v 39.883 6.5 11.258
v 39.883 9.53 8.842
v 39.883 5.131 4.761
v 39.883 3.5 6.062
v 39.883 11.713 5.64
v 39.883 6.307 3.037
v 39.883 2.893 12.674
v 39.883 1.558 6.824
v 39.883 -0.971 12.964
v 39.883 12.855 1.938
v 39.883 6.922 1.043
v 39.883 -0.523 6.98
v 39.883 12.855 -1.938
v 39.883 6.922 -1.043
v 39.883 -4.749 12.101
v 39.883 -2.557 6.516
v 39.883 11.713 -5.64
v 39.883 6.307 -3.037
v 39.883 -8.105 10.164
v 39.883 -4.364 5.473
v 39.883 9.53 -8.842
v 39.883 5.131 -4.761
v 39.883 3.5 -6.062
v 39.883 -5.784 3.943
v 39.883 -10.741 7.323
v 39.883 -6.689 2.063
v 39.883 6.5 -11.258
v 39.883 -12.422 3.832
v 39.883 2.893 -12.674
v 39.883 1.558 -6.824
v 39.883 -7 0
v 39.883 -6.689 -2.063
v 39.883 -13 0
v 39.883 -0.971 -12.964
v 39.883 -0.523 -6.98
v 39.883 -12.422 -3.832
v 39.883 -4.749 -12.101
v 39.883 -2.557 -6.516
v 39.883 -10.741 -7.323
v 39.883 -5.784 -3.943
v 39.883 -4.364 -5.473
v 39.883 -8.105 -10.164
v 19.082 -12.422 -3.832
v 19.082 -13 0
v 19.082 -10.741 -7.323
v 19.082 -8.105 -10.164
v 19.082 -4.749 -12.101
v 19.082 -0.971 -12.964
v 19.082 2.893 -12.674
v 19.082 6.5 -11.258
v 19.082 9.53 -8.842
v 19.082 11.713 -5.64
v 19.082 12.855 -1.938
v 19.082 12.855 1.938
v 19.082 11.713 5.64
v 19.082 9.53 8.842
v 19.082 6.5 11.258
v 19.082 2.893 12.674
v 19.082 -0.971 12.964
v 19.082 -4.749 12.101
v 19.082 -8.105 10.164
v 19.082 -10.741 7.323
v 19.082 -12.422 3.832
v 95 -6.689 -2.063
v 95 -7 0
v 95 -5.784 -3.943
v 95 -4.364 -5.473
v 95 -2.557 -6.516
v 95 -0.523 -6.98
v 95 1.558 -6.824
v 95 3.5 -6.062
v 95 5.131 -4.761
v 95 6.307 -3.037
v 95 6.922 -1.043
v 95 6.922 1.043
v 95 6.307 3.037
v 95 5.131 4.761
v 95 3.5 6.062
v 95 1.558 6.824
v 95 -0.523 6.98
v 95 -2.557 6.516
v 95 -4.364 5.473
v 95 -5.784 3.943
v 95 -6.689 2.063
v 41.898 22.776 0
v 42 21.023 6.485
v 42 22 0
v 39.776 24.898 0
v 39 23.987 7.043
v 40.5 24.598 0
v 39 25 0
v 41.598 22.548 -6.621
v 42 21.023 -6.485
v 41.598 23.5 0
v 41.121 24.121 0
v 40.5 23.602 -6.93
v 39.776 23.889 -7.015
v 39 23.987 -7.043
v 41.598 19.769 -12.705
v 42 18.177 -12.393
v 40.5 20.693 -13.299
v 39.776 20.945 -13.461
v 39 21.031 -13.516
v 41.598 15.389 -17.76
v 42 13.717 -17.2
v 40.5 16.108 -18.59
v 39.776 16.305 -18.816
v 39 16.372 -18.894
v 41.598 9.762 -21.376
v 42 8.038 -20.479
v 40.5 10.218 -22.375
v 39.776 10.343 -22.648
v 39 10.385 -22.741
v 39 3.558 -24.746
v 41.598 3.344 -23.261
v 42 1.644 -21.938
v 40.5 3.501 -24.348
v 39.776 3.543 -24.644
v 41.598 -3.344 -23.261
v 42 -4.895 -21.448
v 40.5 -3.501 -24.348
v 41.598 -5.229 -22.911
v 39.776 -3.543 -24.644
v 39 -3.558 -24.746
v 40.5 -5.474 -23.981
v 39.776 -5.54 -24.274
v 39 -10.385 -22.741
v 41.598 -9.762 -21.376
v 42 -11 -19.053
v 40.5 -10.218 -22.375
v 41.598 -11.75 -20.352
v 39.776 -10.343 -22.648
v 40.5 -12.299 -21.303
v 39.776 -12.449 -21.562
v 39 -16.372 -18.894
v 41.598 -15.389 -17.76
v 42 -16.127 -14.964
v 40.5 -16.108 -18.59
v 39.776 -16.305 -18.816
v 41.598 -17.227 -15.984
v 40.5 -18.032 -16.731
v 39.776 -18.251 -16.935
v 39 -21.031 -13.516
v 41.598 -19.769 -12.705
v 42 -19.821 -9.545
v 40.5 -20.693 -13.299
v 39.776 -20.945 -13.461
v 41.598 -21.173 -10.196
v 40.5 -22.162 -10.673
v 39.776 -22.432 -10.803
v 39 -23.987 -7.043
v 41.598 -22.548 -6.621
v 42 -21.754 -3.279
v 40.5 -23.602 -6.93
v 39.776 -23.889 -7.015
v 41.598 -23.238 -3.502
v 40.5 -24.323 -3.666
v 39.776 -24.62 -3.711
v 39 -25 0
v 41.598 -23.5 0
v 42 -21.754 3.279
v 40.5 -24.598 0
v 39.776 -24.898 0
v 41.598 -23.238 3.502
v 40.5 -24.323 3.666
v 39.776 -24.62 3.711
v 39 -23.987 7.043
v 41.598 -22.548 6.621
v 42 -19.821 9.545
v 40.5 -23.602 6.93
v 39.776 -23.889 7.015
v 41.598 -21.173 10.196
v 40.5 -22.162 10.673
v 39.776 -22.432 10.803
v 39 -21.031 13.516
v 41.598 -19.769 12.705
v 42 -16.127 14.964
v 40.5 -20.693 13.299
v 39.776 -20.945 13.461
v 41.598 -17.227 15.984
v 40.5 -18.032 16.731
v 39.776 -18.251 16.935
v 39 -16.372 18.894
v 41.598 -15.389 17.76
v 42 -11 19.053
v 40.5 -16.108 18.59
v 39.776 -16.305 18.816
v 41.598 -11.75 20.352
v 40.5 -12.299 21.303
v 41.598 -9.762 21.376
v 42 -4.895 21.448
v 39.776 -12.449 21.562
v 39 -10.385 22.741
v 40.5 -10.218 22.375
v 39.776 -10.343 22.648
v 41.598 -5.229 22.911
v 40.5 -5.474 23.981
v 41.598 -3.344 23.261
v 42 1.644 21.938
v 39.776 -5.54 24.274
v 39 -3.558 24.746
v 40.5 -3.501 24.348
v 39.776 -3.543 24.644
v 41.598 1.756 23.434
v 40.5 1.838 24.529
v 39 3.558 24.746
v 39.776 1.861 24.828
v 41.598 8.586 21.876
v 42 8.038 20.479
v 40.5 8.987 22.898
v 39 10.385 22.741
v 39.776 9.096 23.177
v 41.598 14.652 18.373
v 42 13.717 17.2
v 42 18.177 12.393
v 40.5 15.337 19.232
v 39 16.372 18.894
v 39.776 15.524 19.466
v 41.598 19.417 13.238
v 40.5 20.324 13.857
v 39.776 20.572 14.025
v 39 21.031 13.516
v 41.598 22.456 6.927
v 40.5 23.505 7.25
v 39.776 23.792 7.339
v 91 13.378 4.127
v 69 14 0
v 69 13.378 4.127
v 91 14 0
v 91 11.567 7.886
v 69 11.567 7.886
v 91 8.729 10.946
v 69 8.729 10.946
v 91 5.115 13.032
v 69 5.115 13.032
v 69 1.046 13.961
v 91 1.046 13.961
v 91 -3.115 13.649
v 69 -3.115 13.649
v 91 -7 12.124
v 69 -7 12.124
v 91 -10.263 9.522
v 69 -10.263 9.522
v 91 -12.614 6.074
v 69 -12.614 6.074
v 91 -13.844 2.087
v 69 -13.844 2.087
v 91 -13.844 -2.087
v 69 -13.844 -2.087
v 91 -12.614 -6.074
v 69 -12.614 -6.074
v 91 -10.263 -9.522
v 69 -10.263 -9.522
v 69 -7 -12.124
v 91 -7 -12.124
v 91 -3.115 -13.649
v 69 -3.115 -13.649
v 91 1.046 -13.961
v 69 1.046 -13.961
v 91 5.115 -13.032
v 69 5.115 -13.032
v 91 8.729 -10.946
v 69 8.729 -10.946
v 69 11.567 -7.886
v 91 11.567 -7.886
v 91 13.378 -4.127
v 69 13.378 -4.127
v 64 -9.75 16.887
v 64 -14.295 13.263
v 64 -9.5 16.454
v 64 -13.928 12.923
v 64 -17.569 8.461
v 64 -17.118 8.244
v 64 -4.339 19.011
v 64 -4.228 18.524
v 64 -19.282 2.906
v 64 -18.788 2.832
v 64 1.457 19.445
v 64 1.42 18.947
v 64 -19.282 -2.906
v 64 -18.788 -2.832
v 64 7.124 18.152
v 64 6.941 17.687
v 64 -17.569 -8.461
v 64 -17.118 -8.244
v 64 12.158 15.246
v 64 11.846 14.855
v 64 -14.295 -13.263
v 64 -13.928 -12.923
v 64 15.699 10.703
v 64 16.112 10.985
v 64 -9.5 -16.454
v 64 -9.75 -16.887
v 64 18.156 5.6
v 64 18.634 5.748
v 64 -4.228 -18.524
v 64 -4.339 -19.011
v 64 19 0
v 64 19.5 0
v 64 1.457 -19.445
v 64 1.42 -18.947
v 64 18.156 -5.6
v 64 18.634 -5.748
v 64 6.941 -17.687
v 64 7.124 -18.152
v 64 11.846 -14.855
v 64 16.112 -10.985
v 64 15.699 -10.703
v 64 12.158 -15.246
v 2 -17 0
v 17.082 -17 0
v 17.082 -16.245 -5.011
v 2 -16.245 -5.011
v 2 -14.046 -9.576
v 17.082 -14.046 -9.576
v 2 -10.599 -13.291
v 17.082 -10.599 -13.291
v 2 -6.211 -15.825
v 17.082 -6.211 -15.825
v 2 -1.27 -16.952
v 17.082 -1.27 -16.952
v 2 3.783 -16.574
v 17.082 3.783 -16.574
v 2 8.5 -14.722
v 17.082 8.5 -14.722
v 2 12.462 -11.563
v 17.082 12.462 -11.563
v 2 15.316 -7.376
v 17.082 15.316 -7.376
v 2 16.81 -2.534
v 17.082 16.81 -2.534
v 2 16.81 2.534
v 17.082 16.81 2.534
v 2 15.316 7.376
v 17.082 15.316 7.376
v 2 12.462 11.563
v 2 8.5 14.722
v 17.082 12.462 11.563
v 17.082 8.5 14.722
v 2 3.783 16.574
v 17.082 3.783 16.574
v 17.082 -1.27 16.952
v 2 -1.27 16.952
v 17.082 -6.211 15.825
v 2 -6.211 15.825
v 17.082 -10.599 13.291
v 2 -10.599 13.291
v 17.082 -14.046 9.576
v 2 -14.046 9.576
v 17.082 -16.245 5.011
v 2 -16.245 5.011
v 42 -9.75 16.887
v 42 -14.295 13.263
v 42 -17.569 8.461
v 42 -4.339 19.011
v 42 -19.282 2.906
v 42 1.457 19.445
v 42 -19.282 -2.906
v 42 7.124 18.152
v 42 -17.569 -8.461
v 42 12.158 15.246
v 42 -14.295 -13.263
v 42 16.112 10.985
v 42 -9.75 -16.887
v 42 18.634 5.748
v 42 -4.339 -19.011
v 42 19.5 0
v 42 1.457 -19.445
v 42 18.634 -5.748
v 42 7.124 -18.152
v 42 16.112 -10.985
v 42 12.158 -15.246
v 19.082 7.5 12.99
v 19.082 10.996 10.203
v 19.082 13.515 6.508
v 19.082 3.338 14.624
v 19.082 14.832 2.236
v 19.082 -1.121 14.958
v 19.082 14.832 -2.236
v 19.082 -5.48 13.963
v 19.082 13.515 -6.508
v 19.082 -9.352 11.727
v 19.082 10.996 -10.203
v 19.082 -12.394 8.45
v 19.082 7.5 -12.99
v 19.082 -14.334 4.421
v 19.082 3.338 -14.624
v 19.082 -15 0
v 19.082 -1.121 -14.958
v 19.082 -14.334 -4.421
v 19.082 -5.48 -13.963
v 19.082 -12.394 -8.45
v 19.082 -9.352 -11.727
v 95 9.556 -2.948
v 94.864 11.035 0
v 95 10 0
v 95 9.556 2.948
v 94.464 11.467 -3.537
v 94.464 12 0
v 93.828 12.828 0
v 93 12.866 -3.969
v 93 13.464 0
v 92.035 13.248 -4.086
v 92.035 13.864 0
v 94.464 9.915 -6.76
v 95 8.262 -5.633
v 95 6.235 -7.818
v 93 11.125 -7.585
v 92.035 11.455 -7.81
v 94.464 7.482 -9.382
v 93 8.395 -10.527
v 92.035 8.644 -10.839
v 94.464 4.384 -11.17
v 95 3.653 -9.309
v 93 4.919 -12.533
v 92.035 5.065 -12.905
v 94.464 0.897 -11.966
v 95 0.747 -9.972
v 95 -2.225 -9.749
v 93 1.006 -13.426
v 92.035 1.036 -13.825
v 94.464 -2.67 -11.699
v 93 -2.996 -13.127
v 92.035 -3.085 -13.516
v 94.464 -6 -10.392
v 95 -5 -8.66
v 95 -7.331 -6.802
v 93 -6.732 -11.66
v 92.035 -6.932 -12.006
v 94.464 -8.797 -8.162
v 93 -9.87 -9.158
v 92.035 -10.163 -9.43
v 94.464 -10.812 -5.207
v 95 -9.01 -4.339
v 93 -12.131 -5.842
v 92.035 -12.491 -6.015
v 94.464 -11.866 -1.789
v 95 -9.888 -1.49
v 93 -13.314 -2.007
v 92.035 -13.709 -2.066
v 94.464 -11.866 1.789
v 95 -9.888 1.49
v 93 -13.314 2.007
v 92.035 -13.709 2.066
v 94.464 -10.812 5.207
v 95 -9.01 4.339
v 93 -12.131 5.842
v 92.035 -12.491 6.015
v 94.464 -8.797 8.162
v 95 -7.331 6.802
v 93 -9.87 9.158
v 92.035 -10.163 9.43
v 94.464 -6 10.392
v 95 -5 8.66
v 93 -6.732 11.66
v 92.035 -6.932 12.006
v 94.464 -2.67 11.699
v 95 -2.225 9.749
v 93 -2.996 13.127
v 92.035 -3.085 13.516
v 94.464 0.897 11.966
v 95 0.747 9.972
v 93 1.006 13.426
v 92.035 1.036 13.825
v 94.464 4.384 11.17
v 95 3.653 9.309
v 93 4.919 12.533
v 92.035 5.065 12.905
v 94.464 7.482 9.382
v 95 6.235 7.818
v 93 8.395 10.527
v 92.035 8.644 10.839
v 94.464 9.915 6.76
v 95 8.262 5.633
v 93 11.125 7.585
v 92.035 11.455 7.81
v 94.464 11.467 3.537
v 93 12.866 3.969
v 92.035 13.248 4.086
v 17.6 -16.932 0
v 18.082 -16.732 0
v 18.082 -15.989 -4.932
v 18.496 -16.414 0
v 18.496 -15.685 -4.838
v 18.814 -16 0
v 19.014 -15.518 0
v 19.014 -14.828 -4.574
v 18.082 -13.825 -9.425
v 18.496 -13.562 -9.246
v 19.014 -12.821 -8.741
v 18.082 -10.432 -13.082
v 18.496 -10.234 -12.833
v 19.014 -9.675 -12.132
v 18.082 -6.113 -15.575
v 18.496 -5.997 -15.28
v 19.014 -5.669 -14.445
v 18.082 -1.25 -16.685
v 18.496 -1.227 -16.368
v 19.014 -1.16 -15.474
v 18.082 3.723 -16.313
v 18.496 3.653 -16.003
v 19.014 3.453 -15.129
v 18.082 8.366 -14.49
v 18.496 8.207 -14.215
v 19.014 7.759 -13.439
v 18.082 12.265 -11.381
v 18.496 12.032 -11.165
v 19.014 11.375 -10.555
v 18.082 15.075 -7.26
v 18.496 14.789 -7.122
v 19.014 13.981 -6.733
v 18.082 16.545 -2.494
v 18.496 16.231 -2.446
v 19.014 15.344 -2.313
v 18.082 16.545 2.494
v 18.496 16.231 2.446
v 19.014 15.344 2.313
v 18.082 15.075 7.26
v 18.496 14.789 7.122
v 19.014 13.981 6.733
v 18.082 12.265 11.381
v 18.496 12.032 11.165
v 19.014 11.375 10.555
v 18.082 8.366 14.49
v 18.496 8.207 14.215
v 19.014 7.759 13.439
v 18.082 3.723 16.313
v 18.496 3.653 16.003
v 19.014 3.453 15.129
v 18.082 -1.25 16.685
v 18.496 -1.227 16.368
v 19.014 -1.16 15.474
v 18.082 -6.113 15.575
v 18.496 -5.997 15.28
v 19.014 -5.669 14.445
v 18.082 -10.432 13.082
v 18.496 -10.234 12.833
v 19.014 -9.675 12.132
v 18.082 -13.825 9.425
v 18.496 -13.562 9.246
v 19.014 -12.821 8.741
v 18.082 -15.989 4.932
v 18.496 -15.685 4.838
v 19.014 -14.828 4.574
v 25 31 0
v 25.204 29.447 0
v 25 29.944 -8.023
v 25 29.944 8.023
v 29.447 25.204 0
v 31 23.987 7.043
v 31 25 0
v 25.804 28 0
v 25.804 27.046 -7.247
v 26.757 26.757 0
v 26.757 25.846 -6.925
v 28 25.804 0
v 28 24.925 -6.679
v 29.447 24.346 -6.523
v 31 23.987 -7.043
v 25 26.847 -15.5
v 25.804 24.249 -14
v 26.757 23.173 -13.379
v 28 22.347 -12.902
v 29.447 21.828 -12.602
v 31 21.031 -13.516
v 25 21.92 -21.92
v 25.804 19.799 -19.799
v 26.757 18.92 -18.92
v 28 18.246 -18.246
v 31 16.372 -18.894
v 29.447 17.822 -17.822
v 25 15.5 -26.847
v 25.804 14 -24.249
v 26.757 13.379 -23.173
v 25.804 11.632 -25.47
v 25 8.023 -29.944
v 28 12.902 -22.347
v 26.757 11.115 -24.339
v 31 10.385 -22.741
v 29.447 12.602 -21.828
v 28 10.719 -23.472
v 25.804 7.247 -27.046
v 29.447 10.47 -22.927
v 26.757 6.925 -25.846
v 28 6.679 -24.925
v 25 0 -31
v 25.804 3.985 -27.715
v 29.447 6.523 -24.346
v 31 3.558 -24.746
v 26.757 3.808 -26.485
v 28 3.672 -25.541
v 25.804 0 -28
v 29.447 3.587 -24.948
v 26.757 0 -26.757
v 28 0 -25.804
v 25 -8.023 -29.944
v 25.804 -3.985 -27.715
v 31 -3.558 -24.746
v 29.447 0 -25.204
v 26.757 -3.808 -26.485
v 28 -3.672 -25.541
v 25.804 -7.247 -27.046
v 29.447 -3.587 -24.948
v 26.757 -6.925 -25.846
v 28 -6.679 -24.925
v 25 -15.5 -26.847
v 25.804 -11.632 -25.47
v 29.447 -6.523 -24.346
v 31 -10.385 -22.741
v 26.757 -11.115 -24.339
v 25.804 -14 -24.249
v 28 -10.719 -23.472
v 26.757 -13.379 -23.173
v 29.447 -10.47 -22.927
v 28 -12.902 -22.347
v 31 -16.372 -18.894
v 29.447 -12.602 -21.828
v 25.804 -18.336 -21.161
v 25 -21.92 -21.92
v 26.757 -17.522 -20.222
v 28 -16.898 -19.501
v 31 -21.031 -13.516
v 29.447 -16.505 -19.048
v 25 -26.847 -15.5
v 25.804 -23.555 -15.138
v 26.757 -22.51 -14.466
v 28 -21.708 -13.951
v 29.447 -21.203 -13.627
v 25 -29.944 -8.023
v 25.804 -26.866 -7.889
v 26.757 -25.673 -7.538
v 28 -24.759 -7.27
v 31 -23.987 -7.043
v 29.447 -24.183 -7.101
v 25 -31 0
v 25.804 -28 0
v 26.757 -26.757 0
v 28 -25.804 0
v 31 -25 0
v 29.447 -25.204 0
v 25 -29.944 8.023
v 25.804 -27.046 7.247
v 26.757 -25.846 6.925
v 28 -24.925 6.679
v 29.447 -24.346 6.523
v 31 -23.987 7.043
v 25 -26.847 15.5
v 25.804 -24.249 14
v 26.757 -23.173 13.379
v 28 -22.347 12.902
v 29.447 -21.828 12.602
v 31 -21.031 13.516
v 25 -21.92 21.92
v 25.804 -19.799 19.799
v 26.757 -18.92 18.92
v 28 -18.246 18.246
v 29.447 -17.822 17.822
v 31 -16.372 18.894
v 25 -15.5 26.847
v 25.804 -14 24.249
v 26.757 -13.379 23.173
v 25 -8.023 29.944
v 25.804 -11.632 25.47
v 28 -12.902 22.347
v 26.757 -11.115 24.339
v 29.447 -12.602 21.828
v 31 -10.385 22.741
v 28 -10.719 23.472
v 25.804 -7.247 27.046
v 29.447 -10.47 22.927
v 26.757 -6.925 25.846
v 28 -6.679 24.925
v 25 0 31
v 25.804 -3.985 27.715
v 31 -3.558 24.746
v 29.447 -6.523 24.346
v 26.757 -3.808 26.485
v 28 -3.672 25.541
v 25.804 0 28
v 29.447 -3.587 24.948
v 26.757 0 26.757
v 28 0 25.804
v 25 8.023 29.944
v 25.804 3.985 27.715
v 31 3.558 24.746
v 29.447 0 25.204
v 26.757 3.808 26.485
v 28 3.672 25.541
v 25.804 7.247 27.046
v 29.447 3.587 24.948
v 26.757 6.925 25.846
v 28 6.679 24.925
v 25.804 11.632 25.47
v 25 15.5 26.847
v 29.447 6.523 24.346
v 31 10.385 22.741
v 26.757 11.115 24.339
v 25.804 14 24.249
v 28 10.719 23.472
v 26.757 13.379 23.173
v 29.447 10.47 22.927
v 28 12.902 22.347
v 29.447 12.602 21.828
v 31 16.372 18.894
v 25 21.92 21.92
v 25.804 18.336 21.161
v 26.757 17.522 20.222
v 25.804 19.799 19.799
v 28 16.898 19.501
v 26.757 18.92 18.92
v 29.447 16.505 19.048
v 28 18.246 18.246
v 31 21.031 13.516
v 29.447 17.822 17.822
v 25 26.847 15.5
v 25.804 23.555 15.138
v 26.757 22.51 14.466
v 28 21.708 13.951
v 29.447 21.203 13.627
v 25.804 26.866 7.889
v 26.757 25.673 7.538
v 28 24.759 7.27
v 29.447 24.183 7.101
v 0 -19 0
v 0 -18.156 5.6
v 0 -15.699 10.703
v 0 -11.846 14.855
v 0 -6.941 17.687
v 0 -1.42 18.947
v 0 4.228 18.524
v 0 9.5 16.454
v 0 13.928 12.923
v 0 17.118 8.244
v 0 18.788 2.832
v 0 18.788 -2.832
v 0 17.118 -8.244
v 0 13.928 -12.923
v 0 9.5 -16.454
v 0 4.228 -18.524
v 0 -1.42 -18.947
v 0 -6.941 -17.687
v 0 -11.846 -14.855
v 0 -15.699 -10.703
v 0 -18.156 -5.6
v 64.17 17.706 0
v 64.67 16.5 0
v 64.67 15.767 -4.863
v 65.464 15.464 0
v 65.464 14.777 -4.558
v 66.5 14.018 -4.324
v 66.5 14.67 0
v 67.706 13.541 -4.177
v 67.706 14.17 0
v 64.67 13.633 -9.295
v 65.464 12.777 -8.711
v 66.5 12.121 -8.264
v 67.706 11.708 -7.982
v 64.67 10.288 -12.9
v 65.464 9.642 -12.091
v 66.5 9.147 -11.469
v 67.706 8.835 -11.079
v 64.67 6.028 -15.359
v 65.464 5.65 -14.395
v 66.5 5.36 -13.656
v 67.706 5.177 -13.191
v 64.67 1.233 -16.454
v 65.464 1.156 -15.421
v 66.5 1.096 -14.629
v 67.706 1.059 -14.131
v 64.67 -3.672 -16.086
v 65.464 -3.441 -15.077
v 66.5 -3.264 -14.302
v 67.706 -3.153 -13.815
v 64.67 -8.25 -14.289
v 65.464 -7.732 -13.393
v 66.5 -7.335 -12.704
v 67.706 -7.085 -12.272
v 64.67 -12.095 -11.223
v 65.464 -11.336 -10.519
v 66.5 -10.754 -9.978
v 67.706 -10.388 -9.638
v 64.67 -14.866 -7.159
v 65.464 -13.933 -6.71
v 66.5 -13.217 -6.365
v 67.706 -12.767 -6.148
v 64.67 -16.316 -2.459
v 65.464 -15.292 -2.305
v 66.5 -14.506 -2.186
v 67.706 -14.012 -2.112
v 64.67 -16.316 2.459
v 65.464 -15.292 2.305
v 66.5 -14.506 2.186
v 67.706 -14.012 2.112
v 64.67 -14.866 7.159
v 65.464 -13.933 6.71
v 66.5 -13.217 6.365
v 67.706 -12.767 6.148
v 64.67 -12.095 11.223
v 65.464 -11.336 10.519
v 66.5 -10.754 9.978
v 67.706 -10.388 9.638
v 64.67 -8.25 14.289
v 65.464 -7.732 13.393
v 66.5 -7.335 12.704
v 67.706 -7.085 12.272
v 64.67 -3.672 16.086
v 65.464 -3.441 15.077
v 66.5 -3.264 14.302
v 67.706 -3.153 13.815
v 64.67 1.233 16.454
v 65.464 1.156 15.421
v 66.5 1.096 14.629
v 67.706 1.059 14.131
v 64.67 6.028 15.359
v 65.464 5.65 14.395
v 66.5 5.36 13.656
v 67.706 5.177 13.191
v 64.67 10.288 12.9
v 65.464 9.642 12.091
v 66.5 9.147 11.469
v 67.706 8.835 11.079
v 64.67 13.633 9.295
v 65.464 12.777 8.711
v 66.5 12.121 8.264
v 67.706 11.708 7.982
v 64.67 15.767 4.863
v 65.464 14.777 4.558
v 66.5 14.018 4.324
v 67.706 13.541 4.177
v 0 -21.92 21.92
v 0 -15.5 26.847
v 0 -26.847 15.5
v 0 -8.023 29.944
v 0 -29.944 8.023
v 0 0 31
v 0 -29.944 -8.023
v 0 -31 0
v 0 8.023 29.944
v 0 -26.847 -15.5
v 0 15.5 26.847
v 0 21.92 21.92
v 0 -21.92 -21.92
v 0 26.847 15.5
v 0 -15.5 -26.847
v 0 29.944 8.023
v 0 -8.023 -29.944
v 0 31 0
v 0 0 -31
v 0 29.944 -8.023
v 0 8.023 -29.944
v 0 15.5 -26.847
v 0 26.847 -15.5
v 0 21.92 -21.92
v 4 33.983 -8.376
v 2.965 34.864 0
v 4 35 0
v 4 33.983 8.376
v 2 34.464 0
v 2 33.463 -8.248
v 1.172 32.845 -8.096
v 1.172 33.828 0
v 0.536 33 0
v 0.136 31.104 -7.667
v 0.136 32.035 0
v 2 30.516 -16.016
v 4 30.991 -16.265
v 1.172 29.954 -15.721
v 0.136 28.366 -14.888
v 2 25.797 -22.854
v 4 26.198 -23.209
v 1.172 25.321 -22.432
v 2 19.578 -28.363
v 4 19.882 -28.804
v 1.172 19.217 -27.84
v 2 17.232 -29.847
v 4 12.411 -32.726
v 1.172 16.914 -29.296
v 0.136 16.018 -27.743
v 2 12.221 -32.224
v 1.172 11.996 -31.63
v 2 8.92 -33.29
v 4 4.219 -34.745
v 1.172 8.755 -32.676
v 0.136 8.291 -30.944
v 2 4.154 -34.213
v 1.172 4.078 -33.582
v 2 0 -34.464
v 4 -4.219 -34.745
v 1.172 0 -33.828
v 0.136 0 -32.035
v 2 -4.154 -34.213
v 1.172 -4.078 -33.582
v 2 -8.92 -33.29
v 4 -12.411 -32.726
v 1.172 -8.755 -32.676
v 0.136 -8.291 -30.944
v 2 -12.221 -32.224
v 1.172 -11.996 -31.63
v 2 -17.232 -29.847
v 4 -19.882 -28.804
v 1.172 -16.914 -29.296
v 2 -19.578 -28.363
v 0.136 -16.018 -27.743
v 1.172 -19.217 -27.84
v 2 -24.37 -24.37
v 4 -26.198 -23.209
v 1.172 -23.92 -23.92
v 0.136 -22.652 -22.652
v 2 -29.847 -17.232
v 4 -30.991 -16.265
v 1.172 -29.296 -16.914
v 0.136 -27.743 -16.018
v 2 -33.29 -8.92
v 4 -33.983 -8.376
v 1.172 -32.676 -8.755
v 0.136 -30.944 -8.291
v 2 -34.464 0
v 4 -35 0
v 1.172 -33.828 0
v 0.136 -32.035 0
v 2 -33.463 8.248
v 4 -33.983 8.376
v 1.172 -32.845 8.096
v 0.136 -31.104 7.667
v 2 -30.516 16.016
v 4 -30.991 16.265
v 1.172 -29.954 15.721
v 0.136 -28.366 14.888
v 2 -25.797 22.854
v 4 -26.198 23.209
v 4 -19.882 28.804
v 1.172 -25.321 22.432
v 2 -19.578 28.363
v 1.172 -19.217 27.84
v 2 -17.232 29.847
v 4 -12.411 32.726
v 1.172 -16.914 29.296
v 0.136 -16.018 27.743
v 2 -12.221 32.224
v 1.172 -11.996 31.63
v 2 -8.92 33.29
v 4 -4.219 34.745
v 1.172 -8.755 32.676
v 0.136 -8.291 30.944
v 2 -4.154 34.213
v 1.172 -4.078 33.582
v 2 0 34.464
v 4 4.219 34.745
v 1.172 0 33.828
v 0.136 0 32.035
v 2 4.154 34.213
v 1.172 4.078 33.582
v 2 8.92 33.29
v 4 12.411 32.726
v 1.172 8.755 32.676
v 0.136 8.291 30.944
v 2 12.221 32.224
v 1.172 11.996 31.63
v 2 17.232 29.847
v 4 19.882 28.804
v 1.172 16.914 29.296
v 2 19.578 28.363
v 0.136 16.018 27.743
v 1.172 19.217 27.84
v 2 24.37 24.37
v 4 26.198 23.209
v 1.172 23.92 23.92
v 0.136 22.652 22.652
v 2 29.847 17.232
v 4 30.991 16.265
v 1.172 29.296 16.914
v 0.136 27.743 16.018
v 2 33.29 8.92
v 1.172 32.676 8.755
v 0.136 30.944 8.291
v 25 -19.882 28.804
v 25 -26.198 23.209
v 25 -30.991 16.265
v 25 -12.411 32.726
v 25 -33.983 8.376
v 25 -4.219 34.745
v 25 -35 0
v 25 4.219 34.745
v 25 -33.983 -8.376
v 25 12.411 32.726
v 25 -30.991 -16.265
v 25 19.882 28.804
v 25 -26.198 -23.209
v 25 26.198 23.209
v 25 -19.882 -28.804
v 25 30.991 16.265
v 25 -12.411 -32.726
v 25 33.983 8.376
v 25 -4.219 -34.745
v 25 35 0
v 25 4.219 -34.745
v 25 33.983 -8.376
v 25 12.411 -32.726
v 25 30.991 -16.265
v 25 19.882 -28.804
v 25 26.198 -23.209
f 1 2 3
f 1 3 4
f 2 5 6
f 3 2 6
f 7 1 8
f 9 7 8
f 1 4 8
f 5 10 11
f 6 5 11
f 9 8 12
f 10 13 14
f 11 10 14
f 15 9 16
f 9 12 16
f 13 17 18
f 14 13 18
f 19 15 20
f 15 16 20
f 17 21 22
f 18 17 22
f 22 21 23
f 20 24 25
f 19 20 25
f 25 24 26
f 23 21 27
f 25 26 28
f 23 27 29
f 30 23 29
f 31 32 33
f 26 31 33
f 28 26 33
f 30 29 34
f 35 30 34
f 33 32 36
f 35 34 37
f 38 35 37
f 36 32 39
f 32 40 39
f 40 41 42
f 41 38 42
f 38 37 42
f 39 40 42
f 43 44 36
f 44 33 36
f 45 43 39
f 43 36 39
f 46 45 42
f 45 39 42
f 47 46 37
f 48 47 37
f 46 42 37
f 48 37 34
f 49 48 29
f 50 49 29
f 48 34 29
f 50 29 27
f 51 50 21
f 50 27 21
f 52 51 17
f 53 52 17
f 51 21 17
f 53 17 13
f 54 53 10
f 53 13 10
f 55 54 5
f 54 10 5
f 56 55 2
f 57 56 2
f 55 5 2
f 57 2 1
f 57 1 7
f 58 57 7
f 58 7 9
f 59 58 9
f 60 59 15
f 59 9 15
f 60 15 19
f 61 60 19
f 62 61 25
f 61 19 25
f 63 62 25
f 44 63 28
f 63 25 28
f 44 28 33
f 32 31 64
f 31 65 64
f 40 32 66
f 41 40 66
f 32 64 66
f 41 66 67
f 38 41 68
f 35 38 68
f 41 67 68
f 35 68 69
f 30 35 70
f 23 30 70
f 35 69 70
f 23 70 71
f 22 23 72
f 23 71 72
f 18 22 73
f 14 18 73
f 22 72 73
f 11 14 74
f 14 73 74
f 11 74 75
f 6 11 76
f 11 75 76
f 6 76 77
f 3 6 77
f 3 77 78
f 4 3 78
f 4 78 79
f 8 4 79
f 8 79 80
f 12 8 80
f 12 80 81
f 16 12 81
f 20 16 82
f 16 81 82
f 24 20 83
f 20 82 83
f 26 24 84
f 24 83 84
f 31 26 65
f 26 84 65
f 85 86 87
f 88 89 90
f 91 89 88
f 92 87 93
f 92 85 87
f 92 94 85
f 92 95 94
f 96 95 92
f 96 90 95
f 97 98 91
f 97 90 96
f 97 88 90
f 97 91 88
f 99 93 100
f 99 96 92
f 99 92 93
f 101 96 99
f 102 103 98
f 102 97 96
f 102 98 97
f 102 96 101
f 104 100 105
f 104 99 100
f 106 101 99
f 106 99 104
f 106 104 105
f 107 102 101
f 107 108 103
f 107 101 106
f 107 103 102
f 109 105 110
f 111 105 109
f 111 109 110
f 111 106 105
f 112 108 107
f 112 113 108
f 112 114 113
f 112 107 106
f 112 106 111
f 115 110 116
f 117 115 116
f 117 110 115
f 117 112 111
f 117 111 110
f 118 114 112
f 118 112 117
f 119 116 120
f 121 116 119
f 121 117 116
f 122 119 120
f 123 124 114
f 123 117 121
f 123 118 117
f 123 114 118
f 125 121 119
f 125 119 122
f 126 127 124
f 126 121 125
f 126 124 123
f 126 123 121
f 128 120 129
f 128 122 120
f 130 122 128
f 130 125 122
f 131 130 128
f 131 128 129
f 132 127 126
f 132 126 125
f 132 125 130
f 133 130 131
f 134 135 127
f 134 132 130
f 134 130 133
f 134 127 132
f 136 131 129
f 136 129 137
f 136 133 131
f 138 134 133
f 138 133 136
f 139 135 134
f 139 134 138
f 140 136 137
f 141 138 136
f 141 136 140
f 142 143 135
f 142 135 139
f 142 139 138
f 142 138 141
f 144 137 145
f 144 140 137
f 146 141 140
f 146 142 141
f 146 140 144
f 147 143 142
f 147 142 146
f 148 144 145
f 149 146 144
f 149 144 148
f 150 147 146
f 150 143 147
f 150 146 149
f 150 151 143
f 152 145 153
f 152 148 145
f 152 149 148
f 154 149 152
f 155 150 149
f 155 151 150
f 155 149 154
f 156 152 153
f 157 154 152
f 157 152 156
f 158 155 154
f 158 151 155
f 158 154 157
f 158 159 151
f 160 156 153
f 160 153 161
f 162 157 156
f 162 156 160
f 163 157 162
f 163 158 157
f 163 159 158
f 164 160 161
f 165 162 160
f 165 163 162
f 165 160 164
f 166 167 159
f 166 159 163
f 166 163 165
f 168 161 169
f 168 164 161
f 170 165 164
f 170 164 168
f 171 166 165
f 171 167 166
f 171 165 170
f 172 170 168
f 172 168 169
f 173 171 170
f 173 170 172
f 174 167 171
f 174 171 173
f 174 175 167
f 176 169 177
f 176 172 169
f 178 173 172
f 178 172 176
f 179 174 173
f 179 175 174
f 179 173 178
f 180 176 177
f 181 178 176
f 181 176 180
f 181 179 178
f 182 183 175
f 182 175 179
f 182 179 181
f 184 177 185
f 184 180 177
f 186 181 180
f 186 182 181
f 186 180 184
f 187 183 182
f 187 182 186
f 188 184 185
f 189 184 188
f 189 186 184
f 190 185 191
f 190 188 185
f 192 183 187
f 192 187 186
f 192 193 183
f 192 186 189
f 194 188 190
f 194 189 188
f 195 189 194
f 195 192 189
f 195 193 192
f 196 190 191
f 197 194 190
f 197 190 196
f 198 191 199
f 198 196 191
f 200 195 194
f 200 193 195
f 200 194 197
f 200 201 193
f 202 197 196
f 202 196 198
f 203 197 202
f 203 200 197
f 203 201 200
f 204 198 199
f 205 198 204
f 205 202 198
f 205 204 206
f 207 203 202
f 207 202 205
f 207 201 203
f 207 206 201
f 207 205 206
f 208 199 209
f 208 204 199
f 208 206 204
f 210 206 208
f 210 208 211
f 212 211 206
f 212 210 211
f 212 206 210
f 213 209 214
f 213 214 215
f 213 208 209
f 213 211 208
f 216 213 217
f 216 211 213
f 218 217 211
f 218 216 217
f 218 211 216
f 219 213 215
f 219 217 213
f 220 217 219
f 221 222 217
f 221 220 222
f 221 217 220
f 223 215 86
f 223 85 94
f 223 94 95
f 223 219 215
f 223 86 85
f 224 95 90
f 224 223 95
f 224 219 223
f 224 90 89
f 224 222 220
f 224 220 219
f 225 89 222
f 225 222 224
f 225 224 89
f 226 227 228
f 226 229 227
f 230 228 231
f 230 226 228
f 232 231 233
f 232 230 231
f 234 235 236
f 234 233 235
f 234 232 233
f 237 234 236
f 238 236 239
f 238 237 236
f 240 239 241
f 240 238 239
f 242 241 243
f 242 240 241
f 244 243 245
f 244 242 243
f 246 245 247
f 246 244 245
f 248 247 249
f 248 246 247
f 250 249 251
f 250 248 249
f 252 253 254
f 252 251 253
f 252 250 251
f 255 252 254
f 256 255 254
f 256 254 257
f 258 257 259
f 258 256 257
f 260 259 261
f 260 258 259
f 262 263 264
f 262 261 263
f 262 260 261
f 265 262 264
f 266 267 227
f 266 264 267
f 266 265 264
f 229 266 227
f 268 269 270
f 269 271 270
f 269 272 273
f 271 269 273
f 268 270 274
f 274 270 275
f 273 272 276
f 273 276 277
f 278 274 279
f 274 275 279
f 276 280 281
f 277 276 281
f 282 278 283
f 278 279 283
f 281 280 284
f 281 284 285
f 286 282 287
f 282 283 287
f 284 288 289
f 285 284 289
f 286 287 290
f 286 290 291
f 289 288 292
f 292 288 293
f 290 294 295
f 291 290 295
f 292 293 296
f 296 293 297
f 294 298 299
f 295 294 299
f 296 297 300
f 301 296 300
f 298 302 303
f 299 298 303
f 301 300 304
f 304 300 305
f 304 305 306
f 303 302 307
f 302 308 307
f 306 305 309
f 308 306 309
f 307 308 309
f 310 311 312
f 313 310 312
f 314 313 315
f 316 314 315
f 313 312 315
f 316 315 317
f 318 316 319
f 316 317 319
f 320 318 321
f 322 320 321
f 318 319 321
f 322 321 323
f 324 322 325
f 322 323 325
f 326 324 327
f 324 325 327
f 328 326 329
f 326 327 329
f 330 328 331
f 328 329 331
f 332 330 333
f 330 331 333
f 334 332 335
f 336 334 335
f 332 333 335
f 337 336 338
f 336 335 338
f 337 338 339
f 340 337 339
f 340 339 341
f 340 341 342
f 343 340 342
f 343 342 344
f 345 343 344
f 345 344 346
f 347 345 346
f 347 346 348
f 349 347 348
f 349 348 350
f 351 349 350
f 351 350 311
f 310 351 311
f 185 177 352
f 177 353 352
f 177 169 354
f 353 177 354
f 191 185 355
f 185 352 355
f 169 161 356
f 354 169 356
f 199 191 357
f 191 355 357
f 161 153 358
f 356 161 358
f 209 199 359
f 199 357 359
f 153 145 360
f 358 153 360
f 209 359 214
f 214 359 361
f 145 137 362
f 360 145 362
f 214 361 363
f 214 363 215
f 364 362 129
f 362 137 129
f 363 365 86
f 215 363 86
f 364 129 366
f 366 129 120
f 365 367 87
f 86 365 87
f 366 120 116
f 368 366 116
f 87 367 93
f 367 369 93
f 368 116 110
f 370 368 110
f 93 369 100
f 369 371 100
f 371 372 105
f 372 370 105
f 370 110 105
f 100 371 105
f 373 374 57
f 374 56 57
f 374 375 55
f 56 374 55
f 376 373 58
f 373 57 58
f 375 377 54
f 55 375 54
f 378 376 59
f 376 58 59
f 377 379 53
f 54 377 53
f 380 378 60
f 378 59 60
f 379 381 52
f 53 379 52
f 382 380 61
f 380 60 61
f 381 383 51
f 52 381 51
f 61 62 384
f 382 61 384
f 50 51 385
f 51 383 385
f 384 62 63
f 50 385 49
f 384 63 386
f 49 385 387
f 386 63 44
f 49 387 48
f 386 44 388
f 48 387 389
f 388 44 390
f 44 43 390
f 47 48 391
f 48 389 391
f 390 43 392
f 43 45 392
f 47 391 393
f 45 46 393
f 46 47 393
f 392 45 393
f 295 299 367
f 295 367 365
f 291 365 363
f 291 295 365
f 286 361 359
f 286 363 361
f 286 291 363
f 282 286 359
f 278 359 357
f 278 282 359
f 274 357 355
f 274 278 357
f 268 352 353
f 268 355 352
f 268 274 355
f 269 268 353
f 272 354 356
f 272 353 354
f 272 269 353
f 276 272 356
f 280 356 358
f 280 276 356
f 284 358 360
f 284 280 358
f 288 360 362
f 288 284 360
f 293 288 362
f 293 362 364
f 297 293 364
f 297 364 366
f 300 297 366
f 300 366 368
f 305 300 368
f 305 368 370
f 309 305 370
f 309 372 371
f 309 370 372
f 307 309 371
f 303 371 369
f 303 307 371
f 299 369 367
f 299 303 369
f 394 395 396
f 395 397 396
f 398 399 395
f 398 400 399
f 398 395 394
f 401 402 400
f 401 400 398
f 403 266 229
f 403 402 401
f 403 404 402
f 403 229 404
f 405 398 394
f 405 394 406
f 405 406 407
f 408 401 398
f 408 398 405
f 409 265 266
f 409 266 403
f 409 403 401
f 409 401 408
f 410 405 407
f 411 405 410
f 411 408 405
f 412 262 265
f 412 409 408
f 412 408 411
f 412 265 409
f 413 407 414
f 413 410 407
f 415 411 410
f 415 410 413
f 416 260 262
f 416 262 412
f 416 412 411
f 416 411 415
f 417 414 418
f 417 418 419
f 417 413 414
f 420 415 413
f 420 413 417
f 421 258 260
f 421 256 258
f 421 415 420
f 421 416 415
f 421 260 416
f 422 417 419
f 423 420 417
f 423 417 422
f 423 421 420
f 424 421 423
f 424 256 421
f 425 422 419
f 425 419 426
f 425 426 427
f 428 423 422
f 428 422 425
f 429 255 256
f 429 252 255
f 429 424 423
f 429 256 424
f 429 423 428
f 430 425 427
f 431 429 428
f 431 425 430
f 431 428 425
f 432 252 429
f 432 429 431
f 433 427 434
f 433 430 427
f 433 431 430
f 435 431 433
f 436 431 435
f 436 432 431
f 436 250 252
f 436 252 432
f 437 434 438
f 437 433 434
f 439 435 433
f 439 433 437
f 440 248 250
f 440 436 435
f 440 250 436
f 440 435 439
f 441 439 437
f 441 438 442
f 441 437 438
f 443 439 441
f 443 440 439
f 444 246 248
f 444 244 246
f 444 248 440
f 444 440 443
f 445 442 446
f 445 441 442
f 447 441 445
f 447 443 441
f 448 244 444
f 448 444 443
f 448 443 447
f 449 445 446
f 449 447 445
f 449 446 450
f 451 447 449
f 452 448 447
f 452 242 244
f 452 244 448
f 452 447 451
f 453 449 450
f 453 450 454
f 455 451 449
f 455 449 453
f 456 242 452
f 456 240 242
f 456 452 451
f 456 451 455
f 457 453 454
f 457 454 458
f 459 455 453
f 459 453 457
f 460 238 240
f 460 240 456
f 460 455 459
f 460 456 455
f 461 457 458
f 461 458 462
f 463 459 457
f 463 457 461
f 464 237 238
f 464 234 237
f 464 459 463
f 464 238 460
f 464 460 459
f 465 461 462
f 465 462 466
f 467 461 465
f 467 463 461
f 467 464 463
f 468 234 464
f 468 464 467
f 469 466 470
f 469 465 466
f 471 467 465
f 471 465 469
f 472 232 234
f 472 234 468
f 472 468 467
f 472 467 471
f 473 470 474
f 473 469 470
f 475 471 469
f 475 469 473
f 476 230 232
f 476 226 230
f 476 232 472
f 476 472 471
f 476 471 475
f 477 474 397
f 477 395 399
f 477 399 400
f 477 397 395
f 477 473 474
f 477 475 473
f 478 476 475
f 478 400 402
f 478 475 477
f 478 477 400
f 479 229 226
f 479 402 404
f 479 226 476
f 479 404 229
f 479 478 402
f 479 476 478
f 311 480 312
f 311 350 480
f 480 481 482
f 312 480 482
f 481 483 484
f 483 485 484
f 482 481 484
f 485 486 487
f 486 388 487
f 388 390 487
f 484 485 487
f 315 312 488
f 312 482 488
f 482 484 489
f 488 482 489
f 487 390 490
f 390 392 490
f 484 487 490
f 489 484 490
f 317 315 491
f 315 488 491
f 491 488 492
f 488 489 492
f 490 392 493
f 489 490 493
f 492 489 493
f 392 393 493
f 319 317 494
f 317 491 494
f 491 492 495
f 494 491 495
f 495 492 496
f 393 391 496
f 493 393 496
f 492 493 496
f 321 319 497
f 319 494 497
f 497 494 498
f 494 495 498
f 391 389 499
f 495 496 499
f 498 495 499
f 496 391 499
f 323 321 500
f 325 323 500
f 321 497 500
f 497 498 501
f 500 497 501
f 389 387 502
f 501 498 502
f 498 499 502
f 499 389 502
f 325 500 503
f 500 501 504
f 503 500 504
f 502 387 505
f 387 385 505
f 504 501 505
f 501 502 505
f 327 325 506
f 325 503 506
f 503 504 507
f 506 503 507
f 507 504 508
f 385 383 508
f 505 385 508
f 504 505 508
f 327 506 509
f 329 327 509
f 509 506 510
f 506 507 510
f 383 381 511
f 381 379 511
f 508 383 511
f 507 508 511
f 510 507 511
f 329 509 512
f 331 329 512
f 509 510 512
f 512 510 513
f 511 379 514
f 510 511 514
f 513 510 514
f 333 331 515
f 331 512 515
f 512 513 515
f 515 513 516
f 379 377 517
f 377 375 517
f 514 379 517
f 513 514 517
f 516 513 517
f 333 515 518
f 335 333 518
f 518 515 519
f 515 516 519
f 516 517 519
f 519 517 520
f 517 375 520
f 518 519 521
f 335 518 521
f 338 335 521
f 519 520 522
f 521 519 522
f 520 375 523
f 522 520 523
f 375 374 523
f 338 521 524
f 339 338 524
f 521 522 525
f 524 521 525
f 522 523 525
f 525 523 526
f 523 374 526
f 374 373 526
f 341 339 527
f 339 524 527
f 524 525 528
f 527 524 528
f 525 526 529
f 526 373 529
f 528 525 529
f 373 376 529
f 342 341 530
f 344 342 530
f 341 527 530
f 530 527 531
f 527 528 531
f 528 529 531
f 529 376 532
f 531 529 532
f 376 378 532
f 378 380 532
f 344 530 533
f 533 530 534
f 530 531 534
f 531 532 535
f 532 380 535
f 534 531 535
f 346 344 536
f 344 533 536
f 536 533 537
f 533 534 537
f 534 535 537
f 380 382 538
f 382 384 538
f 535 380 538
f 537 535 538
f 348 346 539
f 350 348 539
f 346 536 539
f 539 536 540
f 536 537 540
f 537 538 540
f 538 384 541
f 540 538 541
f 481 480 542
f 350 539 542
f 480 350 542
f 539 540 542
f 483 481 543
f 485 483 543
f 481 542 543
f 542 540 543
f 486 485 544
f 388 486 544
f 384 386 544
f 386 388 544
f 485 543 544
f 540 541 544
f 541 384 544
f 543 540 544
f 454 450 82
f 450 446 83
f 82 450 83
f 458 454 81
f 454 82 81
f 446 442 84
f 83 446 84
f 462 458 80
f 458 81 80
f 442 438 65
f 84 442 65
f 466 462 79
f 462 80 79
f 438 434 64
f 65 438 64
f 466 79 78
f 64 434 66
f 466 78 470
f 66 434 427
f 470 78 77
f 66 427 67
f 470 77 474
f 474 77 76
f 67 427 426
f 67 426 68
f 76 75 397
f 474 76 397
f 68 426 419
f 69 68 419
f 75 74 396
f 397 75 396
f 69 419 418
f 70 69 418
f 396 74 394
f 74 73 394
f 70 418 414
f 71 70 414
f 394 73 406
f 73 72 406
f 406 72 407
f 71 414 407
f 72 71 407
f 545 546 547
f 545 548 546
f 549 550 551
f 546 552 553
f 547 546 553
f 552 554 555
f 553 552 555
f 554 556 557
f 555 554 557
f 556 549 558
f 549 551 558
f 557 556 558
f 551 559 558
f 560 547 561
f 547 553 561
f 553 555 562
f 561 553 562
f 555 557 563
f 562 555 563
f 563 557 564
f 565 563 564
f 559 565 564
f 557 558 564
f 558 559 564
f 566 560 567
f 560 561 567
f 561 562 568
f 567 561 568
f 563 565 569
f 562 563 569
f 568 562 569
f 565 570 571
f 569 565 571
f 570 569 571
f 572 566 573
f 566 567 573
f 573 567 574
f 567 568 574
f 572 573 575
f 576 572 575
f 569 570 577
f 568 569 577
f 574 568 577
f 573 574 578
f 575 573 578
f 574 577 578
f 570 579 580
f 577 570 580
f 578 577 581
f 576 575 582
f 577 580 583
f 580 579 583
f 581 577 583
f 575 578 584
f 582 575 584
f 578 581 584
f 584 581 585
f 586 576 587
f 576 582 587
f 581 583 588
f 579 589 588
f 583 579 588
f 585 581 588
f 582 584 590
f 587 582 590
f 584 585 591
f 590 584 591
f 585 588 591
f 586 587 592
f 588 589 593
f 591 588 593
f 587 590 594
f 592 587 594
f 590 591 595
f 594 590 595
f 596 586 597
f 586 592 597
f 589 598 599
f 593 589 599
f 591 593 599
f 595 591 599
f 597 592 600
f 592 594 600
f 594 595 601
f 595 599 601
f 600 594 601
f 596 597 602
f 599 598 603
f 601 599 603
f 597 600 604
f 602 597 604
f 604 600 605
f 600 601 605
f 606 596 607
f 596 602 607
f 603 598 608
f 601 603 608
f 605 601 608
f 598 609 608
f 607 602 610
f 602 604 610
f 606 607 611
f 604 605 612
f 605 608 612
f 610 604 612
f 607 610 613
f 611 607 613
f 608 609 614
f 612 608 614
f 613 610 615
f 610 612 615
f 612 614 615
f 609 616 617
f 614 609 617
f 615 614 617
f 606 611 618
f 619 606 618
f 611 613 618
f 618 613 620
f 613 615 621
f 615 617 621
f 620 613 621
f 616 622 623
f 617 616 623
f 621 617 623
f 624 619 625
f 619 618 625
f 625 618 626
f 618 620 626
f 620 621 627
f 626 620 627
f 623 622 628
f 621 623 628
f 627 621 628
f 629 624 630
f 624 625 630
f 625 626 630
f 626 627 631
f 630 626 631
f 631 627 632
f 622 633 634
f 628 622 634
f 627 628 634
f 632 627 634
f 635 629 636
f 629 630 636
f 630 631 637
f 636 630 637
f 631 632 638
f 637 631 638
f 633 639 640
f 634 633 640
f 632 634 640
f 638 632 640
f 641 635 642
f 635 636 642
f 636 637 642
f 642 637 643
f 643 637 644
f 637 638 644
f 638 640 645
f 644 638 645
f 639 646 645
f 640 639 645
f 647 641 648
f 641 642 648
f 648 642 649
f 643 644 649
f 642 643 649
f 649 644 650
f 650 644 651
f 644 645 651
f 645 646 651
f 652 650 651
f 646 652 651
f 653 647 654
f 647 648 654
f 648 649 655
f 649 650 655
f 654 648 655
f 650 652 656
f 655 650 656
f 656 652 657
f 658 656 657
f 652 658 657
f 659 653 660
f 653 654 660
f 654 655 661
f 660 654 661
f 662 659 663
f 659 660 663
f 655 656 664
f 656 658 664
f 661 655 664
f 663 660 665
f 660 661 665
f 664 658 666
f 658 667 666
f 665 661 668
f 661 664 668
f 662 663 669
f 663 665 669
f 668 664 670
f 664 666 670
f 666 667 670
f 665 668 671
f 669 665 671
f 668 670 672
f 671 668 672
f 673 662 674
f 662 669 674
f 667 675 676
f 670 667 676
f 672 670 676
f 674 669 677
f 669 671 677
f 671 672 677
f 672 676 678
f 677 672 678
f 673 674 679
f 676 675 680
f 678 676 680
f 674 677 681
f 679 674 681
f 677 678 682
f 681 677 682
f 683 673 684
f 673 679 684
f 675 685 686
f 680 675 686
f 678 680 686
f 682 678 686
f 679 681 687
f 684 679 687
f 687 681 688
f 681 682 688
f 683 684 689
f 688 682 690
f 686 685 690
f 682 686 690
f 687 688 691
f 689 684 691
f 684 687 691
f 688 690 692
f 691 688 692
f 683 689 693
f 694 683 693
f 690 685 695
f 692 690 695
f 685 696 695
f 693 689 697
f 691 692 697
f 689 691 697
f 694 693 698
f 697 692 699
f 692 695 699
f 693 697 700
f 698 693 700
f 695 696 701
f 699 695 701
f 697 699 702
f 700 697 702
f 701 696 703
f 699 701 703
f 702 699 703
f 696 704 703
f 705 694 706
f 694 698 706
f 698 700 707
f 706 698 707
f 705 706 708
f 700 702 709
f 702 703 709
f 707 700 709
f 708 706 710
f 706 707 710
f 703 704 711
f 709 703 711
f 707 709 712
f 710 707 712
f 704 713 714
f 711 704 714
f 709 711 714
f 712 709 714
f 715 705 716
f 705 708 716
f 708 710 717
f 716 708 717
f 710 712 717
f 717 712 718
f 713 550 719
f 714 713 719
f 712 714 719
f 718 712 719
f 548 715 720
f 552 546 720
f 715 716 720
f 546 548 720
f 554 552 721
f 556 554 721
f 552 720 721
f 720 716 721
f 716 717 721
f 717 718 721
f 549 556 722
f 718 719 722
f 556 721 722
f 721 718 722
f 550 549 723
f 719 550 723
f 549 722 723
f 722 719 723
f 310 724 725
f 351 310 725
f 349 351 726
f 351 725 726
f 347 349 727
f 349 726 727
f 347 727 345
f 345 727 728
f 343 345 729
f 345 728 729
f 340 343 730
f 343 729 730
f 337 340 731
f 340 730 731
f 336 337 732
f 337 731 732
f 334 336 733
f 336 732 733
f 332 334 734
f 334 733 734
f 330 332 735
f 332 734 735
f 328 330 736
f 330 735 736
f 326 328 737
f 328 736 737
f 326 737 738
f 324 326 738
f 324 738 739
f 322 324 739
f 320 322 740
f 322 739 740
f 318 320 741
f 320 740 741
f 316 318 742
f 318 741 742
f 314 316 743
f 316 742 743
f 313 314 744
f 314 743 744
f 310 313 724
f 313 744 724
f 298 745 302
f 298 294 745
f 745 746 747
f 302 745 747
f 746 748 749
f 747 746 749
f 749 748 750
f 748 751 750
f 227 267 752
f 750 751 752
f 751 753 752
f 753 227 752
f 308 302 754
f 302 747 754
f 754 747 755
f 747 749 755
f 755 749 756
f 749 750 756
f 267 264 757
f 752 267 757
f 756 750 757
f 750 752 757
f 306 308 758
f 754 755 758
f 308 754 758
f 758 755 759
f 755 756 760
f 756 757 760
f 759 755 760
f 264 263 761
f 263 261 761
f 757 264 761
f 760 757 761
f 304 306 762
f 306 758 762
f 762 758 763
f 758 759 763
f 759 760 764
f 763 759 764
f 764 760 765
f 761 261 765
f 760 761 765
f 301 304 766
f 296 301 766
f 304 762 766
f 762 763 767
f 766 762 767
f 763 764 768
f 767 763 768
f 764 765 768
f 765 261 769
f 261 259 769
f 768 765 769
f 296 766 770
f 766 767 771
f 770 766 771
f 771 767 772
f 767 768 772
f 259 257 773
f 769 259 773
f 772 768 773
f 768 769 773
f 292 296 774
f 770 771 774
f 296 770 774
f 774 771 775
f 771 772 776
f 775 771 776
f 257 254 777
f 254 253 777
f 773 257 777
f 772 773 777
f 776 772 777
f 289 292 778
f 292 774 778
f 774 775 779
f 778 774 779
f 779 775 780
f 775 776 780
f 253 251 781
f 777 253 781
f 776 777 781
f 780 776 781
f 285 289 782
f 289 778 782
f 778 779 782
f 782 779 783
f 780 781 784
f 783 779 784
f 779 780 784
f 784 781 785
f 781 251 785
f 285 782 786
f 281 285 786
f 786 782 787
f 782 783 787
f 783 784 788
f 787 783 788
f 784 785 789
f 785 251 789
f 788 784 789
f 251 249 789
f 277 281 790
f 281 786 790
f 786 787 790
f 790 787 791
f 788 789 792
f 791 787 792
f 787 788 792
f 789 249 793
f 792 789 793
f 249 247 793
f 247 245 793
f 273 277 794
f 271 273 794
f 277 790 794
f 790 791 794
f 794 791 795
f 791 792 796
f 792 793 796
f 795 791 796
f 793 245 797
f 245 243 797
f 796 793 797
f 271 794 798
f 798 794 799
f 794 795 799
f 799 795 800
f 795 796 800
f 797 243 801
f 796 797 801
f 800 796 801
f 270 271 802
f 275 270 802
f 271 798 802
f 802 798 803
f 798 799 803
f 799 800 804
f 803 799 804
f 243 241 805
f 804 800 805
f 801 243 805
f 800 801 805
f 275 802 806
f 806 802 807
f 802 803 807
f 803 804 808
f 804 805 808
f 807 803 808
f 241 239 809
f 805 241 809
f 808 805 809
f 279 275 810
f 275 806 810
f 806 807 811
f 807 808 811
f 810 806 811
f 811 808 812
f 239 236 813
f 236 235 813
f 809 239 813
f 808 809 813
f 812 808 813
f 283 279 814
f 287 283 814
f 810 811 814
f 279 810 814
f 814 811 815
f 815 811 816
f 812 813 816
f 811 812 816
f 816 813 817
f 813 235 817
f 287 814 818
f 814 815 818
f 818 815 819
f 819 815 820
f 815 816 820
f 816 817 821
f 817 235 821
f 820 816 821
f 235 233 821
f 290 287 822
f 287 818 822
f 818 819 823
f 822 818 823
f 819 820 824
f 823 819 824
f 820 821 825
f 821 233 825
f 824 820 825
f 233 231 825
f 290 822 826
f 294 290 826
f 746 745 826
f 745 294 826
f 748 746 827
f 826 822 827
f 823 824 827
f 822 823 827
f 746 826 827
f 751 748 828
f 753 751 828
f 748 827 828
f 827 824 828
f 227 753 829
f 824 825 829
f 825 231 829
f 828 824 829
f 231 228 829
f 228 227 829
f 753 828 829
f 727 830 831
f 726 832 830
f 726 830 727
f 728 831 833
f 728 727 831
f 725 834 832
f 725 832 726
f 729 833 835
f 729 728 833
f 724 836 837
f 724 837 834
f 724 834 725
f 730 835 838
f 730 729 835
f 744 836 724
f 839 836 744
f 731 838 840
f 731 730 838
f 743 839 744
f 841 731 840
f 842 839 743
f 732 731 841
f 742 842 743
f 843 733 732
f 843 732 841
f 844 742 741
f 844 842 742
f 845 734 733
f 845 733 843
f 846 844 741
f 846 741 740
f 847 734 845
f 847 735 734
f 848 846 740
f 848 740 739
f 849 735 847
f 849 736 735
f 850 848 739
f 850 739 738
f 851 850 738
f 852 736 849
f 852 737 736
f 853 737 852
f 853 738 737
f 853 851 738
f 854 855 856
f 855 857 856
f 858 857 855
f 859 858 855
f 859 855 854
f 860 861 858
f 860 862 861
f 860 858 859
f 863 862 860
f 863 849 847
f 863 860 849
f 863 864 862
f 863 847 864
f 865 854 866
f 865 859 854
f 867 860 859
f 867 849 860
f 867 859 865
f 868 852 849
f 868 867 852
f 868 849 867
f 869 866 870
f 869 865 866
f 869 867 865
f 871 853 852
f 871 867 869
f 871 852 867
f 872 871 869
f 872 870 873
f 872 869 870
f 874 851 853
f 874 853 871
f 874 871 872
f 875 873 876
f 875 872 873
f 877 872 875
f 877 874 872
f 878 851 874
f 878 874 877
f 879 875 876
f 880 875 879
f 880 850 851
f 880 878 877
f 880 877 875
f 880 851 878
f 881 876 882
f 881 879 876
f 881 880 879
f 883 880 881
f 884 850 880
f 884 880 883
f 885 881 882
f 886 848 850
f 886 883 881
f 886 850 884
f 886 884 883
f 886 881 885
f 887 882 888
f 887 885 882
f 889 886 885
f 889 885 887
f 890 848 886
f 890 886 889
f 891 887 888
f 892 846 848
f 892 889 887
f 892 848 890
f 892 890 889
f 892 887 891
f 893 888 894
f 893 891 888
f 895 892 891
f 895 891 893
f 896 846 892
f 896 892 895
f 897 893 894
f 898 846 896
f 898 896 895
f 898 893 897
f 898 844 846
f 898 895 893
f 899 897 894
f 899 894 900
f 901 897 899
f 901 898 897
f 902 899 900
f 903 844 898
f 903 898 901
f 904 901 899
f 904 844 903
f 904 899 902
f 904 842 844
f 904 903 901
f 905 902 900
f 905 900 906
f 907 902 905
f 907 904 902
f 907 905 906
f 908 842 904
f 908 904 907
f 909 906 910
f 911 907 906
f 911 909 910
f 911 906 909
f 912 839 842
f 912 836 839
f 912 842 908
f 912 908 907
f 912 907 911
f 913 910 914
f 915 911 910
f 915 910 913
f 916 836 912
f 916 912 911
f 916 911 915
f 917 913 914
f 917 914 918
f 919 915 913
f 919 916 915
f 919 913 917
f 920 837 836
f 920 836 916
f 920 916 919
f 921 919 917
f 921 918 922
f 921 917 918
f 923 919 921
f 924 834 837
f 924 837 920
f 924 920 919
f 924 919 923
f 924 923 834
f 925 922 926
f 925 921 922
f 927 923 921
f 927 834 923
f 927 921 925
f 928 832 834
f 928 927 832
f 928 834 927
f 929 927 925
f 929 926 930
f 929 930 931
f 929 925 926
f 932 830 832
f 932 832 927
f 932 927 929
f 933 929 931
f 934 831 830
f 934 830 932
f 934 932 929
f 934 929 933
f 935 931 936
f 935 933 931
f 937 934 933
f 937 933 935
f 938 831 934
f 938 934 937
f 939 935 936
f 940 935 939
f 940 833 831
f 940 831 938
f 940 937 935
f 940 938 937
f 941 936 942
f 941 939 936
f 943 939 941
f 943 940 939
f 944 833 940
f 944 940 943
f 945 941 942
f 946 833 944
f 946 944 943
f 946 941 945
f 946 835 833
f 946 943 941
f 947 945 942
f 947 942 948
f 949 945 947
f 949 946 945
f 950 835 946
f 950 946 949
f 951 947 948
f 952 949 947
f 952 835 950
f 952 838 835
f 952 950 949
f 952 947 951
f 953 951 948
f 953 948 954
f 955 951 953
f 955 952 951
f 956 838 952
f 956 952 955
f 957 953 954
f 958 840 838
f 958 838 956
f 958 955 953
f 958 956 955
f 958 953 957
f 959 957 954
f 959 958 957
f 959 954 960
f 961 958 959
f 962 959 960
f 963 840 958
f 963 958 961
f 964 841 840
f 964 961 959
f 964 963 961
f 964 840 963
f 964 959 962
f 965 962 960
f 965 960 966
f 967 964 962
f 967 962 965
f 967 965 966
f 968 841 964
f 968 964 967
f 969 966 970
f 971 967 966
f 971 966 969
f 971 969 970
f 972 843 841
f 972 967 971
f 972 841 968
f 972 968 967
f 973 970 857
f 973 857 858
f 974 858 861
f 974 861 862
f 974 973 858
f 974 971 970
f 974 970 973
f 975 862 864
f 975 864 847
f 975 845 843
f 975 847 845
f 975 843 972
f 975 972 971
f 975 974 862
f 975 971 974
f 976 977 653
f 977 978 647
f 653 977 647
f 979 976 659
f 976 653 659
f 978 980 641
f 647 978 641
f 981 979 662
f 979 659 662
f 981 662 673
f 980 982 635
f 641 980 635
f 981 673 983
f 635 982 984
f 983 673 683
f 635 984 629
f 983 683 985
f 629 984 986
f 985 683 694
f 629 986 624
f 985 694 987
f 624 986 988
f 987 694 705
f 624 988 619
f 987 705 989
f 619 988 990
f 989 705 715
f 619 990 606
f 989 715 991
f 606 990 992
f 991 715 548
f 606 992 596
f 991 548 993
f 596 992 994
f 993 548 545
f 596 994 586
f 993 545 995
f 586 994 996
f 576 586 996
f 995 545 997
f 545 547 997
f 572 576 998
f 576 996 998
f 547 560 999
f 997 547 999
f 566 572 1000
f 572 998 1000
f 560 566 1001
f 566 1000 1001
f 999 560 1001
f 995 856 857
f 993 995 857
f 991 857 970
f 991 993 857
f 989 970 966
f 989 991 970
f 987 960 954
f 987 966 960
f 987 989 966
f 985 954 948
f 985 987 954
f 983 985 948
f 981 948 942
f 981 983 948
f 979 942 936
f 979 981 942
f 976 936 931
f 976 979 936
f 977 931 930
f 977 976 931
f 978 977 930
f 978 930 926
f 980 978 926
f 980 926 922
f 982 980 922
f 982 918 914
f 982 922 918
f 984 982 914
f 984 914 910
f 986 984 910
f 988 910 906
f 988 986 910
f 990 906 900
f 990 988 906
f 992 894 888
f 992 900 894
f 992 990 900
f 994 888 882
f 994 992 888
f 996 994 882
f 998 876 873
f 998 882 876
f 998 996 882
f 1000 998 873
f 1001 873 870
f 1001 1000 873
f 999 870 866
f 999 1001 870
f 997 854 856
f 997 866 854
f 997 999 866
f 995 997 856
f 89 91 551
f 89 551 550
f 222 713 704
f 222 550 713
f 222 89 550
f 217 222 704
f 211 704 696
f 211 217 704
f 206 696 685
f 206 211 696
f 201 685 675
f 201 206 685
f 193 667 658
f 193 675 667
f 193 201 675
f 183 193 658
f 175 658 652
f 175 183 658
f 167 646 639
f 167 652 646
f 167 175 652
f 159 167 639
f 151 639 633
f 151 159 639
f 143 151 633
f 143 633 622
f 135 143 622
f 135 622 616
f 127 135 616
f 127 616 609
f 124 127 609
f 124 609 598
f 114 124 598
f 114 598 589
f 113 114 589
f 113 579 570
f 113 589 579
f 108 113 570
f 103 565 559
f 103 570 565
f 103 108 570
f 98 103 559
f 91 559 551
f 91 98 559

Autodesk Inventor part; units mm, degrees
ref_plane "YZ Plane" through (0, 0, 0) normal (1, 0, 0) x (0, 1, 0)
ref_plane "XZ Plane" through (0, 0, 0) normal (0, 1, 0) x (-1, 0, 0)
ref_plane "XY Plane" through (0, 0, 0) normal (0, 0, 1) x (1, 0, 0)
sketch "proba_1" plane through (0, 0, 0) normal (0, 0, 1) x (1, 0, 0)
  line L0 (0, 0) -> (0, 31)
  line L1 (4, 35) -> (25, 35)
  line L2 (25, 35) -> (25, 25)
  line L3 (25, 25) -> (39, 25)
  line L4 (42, 22) -> (42, 19.5)
  line L5 (42, 19.5) -> (64, 19.5)
  line L6 (64, 19.5) -> (64, 14)
  line L7 (64, 14) -> (91, 14)
  line L8 (95, 10) -> (95, 0)
  line L9 (95, 0) -> (0, 0)
  line L10 (0, 0) -> (0, -17)
  line L11 (0, -17) -> (17.0822, -17)
  line L12 (19.0822, -15) -> (19.0822, -13)
  line L13 (19.0822, -13) -> (39.8827, -13)
  line L14 (39.8827, -13) -> (39.8827, -7)
  line L15 (39.8827, -7) -> (95, -7)
  line L16 (95, -7) -> (95, 0)
  arc A0 (17.0822, -17) -> (19.0822, -15) centre (17.0822, -15) ccw
  arc A1 (4, 35) -> (0, 31) centre (4, 31) ccw
  arc A2 (95, 10) -> (91, 14) centre (91, 10) ccw
  arc A3 (42, 22) -> (39, 25) centre (39, 22) ccw
  dimension "d1" = 95
  dimension "d2" = 31
  dimension "d3" = 53
  dimension "d4" = 70
  dimension "d5" = 70
  dimension "d6" = 50
  dimension "d7" = 39
  dimension "d8" = 28
  dimension "d9" = 34
  dimension "d10" = 26
  dimension "d11" = 14
  dimension "d12" = 2
  dimension "d13" = 4
  dimension "d14" = 3
revolve "Obrót1" add sketch "proba_1" angle 360 about axis through (95, 0, 0) along (-1, 0, 0) contours L0 A1 L1 L2 L3 A3 L4 L5 L6 L7 A2 L8 L9
revolve "Obrót2" cut sketch "proba_1" angle 360 about axis through (95, 0, 0) along (1, 0, 0) contours L9 L16 L15 L14 L13 L12 A0 L11 L10
fillet "Zaokrąglenie1" radius 6 1 edges at (25, -25, 0)
fillet "Zaokrąglenie2" radius 5 1 edges at (64, -14, 0)
chamfer "Faza1" distance 2 angle 45 1 edges at (0, 17, 0) measured on face at (0, 25.8684, 3.8291)
properties part number "Bartosz_Zukowski_model_nr_9.ipj"
